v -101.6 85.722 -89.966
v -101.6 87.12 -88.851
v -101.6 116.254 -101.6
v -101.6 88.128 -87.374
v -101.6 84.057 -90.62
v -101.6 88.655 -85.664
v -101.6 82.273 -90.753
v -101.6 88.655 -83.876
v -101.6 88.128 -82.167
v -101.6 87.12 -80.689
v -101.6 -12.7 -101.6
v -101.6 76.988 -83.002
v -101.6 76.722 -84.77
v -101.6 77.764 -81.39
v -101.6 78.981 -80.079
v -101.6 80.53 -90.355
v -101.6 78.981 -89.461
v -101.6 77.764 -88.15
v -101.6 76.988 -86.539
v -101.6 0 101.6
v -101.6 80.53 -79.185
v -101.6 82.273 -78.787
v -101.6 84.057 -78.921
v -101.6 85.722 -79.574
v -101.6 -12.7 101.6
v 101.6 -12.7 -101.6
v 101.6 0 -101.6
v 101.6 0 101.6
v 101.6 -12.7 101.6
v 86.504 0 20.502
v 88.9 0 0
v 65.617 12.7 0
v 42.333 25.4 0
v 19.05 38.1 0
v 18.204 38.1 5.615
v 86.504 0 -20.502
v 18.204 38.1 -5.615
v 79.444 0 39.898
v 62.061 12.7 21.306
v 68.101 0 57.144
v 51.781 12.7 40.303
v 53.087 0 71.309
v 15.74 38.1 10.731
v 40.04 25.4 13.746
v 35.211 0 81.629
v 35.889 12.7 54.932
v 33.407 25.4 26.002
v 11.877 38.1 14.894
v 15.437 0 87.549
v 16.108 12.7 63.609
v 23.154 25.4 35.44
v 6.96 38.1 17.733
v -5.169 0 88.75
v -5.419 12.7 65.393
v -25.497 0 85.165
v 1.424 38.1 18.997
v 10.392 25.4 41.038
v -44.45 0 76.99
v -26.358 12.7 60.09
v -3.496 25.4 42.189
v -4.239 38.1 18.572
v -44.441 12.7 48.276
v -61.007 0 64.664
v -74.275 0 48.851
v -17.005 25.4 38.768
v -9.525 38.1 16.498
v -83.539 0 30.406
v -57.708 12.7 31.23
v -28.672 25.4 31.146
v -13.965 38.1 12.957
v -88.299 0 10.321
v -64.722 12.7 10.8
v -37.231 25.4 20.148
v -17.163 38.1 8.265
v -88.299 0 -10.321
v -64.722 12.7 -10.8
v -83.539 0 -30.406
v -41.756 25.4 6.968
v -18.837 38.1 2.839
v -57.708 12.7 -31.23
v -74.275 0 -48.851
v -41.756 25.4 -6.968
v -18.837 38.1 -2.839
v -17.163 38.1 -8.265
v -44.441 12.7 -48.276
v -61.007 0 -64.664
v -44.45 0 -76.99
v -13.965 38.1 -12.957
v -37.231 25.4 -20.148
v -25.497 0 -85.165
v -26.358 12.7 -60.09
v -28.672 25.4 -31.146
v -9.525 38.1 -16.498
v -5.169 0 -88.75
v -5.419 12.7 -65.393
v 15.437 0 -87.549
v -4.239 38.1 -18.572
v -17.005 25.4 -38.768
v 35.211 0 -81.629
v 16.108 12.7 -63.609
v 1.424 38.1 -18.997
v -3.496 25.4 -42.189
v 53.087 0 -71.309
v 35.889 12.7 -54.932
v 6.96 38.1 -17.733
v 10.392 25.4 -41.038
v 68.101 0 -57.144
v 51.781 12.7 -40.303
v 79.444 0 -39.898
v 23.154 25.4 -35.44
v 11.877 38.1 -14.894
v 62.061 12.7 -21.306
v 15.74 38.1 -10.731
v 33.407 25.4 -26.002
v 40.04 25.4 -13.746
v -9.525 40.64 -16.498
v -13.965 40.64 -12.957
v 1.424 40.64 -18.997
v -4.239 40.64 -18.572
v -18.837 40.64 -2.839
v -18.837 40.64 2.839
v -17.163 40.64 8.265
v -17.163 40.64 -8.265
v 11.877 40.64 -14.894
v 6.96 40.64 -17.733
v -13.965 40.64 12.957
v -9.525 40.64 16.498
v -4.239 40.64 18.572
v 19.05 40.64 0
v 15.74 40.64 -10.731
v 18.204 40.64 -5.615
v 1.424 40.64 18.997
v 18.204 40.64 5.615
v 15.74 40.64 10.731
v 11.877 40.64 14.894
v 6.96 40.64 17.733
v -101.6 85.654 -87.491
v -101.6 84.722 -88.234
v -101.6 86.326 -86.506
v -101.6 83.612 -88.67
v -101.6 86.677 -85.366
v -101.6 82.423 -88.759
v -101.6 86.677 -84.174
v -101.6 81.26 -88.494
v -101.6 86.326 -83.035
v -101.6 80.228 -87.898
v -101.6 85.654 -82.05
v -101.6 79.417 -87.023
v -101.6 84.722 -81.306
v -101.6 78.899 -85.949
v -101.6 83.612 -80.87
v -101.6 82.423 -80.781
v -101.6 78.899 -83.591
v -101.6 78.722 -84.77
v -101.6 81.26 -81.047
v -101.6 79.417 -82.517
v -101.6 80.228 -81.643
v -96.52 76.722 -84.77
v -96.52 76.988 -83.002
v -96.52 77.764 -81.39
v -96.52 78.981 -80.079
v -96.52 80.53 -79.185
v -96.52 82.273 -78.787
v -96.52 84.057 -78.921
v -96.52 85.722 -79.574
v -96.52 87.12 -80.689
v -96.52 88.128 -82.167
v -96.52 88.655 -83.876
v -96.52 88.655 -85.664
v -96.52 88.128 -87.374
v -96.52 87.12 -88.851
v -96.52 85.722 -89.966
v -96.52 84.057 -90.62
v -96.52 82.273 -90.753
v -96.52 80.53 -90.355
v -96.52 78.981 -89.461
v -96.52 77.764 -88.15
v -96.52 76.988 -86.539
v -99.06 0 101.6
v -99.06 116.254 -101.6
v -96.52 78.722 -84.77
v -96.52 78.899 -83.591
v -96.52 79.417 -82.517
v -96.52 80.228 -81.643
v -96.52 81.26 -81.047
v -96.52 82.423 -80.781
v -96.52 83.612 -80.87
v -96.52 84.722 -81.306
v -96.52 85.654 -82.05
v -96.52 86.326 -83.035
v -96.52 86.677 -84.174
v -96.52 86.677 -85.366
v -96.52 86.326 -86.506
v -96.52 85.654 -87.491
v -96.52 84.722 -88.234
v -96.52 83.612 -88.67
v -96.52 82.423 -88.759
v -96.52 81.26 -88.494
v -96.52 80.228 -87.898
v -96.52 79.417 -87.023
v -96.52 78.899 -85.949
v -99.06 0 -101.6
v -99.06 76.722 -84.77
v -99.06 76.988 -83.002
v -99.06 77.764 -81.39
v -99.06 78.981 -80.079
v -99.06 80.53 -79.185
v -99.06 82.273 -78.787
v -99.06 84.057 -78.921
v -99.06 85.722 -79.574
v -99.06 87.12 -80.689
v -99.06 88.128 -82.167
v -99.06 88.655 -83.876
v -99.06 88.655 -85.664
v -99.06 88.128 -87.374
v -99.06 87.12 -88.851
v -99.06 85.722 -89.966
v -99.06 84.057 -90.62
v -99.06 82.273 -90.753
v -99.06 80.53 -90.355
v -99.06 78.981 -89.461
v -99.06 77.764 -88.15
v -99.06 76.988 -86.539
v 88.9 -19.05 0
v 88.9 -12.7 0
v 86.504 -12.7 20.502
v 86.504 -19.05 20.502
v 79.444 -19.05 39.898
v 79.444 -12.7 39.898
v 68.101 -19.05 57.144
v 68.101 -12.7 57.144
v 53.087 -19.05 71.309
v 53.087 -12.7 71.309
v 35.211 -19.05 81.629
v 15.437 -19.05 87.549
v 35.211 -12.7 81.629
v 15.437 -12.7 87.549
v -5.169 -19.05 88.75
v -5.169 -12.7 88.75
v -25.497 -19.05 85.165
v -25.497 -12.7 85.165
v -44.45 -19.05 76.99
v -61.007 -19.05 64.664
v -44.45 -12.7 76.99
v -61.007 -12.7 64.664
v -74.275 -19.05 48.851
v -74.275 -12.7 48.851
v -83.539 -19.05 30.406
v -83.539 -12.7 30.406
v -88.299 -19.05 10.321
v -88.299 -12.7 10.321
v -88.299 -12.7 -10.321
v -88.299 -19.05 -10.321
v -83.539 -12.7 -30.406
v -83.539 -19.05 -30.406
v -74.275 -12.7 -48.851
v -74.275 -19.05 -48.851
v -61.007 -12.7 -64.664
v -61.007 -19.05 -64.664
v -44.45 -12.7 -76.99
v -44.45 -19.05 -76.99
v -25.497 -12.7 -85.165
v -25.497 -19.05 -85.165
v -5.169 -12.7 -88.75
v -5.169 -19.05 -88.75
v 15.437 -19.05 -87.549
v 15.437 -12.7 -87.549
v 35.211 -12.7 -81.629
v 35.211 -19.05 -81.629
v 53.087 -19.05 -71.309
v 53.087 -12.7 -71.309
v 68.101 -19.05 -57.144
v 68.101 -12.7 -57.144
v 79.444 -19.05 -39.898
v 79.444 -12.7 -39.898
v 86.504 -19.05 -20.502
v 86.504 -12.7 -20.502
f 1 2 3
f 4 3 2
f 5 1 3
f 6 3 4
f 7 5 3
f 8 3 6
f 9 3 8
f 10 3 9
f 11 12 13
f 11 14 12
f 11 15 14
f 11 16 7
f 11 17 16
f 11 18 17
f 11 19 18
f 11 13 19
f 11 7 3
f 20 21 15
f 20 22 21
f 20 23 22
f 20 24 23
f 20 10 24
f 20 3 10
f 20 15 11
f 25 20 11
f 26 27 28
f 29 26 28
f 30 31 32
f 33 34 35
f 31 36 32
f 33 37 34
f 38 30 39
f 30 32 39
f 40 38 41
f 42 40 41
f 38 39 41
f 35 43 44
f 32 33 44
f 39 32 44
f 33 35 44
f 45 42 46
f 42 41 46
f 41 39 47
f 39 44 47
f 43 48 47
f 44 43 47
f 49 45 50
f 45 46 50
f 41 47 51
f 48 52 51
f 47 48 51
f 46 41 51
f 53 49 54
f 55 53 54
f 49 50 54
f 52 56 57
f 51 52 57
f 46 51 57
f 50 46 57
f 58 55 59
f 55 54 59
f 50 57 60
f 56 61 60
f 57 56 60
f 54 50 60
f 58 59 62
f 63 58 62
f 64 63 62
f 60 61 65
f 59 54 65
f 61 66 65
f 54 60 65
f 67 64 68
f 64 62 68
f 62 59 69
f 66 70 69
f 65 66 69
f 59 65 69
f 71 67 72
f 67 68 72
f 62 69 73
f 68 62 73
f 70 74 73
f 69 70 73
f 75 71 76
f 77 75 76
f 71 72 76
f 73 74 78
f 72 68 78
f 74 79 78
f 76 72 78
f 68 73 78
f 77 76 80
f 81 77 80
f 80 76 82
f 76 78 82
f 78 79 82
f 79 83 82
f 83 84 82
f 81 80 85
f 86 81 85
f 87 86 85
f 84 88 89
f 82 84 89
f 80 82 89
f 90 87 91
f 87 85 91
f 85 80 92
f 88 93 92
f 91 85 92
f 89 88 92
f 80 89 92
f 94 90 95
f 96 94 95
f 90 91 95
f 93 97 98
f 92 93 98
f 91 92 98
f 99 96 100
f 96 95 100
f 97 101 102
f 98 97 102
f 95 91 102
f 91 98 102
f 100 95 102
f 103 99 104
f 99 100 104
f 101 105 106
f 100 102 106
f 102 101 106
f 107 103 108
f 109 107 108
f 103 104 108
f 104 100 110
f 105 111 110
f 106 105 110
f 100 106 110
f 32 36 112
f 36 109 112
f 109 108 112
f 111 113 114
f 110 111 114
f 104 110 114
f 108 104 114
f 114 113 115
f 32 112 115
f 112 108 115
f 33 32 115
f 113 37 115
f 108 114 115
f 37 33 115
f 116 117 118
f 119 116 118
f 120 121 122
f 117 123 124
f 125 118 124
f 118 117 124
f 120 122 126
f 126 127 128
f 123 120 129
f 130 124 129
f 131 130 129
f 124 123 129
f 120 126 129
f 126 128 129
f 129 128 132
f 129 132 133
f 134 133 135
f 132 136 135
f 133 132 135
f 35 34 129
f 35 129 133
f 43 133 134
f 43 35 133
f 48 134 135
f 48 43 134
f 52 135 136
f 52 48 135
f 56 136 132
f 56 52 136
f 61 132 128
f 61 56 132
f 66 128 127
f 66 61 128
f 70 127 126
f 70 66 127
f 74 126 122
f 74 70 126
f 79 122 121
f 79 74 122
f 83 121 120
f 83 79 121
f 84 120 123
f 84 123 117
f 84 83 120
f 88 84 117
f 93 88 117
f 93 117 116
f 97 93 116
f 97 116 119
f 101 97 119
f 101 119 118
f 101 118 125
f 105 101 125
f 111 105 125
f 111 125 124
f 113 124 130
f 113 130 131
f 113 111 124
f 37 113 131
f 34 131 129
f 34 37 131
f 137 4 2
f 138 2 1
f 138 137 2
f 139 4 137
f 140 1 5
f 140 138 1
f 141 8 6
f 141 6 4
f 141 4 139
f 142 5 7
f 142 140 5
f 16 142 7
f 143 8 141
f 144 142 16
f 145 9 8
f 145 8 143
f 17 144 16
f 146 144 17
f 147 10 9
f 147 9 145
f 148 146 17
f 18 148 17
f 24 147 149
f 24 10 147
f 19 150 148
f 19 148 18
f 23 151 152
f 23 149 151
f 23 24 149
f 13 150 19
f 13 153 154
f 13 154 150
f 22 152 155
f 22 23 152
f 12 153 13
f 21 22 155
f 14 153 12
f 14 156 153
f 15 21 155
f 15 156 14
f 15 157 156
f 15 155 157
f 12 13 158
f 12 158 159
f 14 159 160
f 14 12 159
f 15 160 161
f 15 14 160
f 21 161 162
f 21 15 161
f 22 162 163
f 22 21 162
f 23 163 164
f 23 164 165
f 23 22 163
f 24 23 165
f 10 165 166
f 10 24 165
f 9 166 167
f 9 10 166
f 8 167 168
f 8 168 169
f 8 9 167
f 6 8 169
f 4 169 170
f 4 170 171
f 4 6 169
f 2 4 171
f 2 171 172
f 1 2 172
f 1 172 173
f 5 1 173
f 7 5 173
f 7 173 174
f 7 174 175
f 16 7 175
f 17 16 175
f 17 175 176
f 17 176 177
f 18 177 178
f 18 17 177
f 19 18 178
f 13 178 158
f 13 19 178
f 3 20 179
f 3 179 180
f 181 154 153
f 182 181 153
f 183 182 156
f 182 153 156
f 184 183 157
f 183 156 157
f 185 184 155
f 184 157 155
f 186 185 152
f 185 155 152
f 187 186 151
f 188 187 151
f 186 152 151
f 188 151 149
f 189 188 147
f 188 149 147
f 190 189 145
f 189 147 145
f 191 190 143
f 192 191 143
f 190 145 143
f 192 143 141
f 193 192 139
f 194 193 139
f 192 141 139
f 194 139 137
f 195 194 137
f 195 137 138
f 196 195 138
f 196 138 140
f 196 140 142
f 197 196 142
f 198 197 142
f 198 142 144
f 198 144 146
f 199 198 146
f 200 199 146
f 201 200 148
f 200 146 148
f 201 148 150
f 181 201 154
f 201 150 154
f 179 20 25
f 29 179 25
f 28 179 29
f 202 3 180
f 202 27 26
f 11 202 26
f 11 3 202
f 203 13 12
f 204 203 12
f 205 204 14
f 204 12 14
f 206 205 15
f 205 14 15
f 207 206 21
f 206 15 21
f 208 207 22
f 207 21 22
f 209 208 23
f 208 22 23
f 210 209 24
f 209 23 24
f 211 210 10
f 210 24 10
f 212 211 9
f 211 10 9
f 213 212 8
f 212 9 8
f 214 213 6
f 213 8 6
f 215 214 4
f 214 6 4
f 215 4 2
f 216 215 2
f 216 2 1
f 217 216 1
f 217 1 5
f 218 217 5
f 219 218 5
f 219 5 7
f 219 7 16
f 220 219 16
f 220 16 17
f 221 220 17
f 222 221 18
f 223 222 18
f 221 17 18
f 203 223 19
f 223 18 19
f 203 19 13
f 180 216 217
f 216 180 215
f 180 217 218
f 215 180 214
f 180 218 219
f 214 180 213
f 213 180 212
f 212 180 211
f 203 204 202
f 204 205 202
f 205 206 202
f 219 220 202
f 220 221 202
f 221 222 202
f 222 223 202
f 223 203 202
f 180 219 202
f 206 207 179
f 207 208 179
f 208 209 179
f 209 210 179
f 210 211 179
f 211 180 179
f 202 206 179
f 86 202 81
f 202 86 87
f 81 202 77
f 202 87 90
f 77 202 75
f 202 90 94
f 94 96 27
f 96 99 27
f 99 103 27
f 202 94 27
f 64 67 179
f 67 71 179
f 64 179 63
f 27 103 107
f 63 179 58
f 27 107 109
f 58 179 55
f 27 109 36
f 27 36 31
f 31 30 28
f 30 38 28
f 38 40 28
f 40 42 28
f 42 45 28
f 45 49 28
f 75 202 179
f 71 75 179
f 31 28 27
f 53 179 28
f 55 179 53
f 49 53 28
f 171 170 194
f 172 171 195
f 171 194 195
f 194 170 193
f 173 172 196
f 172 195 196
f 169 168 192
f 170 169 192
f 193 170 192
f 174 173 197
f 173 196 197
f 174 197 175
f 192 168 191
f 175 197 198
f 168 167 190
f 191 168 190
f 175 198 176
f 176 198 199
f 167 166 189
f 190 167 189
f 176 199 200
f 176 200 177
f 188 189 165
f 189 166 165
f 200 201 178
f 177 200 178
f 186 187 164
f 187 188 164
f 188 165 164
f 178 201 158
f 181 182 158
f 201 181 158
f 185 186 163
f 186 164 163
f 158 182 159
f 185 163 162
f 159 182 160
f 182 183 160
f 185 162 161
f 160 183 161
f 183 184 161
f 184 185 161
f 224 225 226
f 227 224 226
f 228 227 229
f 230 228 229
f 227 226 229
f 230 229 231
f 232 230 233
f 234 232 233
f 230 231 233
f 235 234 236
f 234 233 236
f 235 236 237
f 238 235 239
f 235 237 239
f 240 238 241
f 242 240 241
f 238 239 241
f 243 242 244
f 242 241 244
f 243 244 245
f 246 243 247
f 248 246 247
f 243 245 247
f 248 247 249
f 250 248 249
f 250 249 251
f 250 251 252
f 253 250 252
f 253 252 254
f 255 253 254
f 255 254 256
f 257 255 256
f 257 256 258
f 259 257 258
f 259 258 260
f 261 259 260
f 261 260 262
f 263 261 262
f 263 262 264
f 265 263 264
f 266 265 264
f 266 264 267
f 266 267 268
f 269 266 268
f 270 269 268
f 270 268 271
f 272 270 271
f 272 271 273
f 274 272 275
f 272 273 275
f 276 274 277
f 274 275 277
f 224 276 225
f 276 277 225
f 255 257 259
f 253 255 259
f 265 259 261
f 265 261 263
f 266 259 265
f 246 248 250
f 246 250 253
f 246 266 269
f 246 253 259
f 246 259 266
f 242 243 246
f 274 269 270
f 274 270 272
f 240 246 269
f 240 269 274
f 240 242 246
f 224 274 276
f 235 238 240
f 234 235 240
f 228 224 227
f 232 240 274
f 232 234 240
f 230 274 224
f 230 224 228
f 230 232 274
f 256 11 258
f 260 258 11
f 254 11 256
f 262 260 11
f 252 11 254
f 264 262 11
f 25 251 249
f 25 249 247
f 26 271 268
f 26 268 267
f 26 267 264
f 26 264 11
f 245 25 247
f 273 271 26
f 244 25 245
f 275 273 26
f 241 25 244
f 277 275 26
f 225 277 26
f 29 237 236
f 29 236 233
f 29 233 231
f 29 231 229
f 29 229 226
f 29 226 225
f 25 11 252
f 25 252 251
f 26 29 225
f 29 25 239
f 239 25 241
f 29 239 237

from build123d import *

# Parameters (mm, degrees)
F0_W     = 203.2
F0_H     = 203.2
F0_R     = 88.9
F1_DEPTH = 12.7
F2_DEPTH = 19.05
F3_R     = 6
F4_DEPTH = 2.54
F3_R_2   = 4
F5_DEPTH = 5.08
F7_R     = 19.05
F9_DEPTH = 2.54


with BuildPart() as f1:
    # F0 (on Front) → F1 (new body)
    with BuildSketch(Plane.XZ):
        Rectangle(F0_W, F0_H)
        Circle(F0_R, mode=Mode.SUBTRACT)
        Circle(F0_R)
    extrude(amount=F1_DEPTH)

    # F0 (on Front) → F2 (join)
    with BuildSketch(Plane.XZ):
        Circle(F0_R)
    extrude(amount=F2_DEPTH)

    # F3 (on face) → F4 (join)
    with BuildSketch(Plane(origin=(-101.6, 0, 0), x_dir=(0, -1, 0), z_dir=(-1, 0, 0))):
        Polygon((-116.2542924285, -101.6), (0, -101.6), (0, 101.6), align=None)
        with Locations((-82.7217820338, -84.7702106243)):
            Circle(F3_R, mode=Mode.SUBTRACT)
    extrude(amount=-F4_DEPTH)

    # F0 (on Front) → F8 section 0
    with BuildSketch(Plane.XZ):
        Circle(F0_R)
    # F7 (on offset) → F8 section 1
    with BuildSketch(Plane.XZ.offset(-38.1)):
        Circle(F7_R)
    loft()

    # F9 (add): a face of the model
    f9_faces = [f1.faces().sort_by_distance(p)[0] for p in [
        (0, 38.1, 0),
    ]]
    extrude(f9_faces, amount=F9_DEPTH)


with BuildPart() as f5:
    # F3 (on face) → F5 (new body)
    with BuildSketch(Plane(origin=(-101.6, 0, 0), x_dir=(0, -1, 0), z_dir=(-1, 0, 0))):
        with Locations((-82.7217820338, -84.7702106243)):
            Circle(F3_R)
        with Locations((-82.7217820338, -84.7702106243)):
            Circle(F3_R_2, mode=Mode.SUBTRACT)
    extrude(amount=-F5_DEPTH)


solid = Compound([f1.part, f5.part])
